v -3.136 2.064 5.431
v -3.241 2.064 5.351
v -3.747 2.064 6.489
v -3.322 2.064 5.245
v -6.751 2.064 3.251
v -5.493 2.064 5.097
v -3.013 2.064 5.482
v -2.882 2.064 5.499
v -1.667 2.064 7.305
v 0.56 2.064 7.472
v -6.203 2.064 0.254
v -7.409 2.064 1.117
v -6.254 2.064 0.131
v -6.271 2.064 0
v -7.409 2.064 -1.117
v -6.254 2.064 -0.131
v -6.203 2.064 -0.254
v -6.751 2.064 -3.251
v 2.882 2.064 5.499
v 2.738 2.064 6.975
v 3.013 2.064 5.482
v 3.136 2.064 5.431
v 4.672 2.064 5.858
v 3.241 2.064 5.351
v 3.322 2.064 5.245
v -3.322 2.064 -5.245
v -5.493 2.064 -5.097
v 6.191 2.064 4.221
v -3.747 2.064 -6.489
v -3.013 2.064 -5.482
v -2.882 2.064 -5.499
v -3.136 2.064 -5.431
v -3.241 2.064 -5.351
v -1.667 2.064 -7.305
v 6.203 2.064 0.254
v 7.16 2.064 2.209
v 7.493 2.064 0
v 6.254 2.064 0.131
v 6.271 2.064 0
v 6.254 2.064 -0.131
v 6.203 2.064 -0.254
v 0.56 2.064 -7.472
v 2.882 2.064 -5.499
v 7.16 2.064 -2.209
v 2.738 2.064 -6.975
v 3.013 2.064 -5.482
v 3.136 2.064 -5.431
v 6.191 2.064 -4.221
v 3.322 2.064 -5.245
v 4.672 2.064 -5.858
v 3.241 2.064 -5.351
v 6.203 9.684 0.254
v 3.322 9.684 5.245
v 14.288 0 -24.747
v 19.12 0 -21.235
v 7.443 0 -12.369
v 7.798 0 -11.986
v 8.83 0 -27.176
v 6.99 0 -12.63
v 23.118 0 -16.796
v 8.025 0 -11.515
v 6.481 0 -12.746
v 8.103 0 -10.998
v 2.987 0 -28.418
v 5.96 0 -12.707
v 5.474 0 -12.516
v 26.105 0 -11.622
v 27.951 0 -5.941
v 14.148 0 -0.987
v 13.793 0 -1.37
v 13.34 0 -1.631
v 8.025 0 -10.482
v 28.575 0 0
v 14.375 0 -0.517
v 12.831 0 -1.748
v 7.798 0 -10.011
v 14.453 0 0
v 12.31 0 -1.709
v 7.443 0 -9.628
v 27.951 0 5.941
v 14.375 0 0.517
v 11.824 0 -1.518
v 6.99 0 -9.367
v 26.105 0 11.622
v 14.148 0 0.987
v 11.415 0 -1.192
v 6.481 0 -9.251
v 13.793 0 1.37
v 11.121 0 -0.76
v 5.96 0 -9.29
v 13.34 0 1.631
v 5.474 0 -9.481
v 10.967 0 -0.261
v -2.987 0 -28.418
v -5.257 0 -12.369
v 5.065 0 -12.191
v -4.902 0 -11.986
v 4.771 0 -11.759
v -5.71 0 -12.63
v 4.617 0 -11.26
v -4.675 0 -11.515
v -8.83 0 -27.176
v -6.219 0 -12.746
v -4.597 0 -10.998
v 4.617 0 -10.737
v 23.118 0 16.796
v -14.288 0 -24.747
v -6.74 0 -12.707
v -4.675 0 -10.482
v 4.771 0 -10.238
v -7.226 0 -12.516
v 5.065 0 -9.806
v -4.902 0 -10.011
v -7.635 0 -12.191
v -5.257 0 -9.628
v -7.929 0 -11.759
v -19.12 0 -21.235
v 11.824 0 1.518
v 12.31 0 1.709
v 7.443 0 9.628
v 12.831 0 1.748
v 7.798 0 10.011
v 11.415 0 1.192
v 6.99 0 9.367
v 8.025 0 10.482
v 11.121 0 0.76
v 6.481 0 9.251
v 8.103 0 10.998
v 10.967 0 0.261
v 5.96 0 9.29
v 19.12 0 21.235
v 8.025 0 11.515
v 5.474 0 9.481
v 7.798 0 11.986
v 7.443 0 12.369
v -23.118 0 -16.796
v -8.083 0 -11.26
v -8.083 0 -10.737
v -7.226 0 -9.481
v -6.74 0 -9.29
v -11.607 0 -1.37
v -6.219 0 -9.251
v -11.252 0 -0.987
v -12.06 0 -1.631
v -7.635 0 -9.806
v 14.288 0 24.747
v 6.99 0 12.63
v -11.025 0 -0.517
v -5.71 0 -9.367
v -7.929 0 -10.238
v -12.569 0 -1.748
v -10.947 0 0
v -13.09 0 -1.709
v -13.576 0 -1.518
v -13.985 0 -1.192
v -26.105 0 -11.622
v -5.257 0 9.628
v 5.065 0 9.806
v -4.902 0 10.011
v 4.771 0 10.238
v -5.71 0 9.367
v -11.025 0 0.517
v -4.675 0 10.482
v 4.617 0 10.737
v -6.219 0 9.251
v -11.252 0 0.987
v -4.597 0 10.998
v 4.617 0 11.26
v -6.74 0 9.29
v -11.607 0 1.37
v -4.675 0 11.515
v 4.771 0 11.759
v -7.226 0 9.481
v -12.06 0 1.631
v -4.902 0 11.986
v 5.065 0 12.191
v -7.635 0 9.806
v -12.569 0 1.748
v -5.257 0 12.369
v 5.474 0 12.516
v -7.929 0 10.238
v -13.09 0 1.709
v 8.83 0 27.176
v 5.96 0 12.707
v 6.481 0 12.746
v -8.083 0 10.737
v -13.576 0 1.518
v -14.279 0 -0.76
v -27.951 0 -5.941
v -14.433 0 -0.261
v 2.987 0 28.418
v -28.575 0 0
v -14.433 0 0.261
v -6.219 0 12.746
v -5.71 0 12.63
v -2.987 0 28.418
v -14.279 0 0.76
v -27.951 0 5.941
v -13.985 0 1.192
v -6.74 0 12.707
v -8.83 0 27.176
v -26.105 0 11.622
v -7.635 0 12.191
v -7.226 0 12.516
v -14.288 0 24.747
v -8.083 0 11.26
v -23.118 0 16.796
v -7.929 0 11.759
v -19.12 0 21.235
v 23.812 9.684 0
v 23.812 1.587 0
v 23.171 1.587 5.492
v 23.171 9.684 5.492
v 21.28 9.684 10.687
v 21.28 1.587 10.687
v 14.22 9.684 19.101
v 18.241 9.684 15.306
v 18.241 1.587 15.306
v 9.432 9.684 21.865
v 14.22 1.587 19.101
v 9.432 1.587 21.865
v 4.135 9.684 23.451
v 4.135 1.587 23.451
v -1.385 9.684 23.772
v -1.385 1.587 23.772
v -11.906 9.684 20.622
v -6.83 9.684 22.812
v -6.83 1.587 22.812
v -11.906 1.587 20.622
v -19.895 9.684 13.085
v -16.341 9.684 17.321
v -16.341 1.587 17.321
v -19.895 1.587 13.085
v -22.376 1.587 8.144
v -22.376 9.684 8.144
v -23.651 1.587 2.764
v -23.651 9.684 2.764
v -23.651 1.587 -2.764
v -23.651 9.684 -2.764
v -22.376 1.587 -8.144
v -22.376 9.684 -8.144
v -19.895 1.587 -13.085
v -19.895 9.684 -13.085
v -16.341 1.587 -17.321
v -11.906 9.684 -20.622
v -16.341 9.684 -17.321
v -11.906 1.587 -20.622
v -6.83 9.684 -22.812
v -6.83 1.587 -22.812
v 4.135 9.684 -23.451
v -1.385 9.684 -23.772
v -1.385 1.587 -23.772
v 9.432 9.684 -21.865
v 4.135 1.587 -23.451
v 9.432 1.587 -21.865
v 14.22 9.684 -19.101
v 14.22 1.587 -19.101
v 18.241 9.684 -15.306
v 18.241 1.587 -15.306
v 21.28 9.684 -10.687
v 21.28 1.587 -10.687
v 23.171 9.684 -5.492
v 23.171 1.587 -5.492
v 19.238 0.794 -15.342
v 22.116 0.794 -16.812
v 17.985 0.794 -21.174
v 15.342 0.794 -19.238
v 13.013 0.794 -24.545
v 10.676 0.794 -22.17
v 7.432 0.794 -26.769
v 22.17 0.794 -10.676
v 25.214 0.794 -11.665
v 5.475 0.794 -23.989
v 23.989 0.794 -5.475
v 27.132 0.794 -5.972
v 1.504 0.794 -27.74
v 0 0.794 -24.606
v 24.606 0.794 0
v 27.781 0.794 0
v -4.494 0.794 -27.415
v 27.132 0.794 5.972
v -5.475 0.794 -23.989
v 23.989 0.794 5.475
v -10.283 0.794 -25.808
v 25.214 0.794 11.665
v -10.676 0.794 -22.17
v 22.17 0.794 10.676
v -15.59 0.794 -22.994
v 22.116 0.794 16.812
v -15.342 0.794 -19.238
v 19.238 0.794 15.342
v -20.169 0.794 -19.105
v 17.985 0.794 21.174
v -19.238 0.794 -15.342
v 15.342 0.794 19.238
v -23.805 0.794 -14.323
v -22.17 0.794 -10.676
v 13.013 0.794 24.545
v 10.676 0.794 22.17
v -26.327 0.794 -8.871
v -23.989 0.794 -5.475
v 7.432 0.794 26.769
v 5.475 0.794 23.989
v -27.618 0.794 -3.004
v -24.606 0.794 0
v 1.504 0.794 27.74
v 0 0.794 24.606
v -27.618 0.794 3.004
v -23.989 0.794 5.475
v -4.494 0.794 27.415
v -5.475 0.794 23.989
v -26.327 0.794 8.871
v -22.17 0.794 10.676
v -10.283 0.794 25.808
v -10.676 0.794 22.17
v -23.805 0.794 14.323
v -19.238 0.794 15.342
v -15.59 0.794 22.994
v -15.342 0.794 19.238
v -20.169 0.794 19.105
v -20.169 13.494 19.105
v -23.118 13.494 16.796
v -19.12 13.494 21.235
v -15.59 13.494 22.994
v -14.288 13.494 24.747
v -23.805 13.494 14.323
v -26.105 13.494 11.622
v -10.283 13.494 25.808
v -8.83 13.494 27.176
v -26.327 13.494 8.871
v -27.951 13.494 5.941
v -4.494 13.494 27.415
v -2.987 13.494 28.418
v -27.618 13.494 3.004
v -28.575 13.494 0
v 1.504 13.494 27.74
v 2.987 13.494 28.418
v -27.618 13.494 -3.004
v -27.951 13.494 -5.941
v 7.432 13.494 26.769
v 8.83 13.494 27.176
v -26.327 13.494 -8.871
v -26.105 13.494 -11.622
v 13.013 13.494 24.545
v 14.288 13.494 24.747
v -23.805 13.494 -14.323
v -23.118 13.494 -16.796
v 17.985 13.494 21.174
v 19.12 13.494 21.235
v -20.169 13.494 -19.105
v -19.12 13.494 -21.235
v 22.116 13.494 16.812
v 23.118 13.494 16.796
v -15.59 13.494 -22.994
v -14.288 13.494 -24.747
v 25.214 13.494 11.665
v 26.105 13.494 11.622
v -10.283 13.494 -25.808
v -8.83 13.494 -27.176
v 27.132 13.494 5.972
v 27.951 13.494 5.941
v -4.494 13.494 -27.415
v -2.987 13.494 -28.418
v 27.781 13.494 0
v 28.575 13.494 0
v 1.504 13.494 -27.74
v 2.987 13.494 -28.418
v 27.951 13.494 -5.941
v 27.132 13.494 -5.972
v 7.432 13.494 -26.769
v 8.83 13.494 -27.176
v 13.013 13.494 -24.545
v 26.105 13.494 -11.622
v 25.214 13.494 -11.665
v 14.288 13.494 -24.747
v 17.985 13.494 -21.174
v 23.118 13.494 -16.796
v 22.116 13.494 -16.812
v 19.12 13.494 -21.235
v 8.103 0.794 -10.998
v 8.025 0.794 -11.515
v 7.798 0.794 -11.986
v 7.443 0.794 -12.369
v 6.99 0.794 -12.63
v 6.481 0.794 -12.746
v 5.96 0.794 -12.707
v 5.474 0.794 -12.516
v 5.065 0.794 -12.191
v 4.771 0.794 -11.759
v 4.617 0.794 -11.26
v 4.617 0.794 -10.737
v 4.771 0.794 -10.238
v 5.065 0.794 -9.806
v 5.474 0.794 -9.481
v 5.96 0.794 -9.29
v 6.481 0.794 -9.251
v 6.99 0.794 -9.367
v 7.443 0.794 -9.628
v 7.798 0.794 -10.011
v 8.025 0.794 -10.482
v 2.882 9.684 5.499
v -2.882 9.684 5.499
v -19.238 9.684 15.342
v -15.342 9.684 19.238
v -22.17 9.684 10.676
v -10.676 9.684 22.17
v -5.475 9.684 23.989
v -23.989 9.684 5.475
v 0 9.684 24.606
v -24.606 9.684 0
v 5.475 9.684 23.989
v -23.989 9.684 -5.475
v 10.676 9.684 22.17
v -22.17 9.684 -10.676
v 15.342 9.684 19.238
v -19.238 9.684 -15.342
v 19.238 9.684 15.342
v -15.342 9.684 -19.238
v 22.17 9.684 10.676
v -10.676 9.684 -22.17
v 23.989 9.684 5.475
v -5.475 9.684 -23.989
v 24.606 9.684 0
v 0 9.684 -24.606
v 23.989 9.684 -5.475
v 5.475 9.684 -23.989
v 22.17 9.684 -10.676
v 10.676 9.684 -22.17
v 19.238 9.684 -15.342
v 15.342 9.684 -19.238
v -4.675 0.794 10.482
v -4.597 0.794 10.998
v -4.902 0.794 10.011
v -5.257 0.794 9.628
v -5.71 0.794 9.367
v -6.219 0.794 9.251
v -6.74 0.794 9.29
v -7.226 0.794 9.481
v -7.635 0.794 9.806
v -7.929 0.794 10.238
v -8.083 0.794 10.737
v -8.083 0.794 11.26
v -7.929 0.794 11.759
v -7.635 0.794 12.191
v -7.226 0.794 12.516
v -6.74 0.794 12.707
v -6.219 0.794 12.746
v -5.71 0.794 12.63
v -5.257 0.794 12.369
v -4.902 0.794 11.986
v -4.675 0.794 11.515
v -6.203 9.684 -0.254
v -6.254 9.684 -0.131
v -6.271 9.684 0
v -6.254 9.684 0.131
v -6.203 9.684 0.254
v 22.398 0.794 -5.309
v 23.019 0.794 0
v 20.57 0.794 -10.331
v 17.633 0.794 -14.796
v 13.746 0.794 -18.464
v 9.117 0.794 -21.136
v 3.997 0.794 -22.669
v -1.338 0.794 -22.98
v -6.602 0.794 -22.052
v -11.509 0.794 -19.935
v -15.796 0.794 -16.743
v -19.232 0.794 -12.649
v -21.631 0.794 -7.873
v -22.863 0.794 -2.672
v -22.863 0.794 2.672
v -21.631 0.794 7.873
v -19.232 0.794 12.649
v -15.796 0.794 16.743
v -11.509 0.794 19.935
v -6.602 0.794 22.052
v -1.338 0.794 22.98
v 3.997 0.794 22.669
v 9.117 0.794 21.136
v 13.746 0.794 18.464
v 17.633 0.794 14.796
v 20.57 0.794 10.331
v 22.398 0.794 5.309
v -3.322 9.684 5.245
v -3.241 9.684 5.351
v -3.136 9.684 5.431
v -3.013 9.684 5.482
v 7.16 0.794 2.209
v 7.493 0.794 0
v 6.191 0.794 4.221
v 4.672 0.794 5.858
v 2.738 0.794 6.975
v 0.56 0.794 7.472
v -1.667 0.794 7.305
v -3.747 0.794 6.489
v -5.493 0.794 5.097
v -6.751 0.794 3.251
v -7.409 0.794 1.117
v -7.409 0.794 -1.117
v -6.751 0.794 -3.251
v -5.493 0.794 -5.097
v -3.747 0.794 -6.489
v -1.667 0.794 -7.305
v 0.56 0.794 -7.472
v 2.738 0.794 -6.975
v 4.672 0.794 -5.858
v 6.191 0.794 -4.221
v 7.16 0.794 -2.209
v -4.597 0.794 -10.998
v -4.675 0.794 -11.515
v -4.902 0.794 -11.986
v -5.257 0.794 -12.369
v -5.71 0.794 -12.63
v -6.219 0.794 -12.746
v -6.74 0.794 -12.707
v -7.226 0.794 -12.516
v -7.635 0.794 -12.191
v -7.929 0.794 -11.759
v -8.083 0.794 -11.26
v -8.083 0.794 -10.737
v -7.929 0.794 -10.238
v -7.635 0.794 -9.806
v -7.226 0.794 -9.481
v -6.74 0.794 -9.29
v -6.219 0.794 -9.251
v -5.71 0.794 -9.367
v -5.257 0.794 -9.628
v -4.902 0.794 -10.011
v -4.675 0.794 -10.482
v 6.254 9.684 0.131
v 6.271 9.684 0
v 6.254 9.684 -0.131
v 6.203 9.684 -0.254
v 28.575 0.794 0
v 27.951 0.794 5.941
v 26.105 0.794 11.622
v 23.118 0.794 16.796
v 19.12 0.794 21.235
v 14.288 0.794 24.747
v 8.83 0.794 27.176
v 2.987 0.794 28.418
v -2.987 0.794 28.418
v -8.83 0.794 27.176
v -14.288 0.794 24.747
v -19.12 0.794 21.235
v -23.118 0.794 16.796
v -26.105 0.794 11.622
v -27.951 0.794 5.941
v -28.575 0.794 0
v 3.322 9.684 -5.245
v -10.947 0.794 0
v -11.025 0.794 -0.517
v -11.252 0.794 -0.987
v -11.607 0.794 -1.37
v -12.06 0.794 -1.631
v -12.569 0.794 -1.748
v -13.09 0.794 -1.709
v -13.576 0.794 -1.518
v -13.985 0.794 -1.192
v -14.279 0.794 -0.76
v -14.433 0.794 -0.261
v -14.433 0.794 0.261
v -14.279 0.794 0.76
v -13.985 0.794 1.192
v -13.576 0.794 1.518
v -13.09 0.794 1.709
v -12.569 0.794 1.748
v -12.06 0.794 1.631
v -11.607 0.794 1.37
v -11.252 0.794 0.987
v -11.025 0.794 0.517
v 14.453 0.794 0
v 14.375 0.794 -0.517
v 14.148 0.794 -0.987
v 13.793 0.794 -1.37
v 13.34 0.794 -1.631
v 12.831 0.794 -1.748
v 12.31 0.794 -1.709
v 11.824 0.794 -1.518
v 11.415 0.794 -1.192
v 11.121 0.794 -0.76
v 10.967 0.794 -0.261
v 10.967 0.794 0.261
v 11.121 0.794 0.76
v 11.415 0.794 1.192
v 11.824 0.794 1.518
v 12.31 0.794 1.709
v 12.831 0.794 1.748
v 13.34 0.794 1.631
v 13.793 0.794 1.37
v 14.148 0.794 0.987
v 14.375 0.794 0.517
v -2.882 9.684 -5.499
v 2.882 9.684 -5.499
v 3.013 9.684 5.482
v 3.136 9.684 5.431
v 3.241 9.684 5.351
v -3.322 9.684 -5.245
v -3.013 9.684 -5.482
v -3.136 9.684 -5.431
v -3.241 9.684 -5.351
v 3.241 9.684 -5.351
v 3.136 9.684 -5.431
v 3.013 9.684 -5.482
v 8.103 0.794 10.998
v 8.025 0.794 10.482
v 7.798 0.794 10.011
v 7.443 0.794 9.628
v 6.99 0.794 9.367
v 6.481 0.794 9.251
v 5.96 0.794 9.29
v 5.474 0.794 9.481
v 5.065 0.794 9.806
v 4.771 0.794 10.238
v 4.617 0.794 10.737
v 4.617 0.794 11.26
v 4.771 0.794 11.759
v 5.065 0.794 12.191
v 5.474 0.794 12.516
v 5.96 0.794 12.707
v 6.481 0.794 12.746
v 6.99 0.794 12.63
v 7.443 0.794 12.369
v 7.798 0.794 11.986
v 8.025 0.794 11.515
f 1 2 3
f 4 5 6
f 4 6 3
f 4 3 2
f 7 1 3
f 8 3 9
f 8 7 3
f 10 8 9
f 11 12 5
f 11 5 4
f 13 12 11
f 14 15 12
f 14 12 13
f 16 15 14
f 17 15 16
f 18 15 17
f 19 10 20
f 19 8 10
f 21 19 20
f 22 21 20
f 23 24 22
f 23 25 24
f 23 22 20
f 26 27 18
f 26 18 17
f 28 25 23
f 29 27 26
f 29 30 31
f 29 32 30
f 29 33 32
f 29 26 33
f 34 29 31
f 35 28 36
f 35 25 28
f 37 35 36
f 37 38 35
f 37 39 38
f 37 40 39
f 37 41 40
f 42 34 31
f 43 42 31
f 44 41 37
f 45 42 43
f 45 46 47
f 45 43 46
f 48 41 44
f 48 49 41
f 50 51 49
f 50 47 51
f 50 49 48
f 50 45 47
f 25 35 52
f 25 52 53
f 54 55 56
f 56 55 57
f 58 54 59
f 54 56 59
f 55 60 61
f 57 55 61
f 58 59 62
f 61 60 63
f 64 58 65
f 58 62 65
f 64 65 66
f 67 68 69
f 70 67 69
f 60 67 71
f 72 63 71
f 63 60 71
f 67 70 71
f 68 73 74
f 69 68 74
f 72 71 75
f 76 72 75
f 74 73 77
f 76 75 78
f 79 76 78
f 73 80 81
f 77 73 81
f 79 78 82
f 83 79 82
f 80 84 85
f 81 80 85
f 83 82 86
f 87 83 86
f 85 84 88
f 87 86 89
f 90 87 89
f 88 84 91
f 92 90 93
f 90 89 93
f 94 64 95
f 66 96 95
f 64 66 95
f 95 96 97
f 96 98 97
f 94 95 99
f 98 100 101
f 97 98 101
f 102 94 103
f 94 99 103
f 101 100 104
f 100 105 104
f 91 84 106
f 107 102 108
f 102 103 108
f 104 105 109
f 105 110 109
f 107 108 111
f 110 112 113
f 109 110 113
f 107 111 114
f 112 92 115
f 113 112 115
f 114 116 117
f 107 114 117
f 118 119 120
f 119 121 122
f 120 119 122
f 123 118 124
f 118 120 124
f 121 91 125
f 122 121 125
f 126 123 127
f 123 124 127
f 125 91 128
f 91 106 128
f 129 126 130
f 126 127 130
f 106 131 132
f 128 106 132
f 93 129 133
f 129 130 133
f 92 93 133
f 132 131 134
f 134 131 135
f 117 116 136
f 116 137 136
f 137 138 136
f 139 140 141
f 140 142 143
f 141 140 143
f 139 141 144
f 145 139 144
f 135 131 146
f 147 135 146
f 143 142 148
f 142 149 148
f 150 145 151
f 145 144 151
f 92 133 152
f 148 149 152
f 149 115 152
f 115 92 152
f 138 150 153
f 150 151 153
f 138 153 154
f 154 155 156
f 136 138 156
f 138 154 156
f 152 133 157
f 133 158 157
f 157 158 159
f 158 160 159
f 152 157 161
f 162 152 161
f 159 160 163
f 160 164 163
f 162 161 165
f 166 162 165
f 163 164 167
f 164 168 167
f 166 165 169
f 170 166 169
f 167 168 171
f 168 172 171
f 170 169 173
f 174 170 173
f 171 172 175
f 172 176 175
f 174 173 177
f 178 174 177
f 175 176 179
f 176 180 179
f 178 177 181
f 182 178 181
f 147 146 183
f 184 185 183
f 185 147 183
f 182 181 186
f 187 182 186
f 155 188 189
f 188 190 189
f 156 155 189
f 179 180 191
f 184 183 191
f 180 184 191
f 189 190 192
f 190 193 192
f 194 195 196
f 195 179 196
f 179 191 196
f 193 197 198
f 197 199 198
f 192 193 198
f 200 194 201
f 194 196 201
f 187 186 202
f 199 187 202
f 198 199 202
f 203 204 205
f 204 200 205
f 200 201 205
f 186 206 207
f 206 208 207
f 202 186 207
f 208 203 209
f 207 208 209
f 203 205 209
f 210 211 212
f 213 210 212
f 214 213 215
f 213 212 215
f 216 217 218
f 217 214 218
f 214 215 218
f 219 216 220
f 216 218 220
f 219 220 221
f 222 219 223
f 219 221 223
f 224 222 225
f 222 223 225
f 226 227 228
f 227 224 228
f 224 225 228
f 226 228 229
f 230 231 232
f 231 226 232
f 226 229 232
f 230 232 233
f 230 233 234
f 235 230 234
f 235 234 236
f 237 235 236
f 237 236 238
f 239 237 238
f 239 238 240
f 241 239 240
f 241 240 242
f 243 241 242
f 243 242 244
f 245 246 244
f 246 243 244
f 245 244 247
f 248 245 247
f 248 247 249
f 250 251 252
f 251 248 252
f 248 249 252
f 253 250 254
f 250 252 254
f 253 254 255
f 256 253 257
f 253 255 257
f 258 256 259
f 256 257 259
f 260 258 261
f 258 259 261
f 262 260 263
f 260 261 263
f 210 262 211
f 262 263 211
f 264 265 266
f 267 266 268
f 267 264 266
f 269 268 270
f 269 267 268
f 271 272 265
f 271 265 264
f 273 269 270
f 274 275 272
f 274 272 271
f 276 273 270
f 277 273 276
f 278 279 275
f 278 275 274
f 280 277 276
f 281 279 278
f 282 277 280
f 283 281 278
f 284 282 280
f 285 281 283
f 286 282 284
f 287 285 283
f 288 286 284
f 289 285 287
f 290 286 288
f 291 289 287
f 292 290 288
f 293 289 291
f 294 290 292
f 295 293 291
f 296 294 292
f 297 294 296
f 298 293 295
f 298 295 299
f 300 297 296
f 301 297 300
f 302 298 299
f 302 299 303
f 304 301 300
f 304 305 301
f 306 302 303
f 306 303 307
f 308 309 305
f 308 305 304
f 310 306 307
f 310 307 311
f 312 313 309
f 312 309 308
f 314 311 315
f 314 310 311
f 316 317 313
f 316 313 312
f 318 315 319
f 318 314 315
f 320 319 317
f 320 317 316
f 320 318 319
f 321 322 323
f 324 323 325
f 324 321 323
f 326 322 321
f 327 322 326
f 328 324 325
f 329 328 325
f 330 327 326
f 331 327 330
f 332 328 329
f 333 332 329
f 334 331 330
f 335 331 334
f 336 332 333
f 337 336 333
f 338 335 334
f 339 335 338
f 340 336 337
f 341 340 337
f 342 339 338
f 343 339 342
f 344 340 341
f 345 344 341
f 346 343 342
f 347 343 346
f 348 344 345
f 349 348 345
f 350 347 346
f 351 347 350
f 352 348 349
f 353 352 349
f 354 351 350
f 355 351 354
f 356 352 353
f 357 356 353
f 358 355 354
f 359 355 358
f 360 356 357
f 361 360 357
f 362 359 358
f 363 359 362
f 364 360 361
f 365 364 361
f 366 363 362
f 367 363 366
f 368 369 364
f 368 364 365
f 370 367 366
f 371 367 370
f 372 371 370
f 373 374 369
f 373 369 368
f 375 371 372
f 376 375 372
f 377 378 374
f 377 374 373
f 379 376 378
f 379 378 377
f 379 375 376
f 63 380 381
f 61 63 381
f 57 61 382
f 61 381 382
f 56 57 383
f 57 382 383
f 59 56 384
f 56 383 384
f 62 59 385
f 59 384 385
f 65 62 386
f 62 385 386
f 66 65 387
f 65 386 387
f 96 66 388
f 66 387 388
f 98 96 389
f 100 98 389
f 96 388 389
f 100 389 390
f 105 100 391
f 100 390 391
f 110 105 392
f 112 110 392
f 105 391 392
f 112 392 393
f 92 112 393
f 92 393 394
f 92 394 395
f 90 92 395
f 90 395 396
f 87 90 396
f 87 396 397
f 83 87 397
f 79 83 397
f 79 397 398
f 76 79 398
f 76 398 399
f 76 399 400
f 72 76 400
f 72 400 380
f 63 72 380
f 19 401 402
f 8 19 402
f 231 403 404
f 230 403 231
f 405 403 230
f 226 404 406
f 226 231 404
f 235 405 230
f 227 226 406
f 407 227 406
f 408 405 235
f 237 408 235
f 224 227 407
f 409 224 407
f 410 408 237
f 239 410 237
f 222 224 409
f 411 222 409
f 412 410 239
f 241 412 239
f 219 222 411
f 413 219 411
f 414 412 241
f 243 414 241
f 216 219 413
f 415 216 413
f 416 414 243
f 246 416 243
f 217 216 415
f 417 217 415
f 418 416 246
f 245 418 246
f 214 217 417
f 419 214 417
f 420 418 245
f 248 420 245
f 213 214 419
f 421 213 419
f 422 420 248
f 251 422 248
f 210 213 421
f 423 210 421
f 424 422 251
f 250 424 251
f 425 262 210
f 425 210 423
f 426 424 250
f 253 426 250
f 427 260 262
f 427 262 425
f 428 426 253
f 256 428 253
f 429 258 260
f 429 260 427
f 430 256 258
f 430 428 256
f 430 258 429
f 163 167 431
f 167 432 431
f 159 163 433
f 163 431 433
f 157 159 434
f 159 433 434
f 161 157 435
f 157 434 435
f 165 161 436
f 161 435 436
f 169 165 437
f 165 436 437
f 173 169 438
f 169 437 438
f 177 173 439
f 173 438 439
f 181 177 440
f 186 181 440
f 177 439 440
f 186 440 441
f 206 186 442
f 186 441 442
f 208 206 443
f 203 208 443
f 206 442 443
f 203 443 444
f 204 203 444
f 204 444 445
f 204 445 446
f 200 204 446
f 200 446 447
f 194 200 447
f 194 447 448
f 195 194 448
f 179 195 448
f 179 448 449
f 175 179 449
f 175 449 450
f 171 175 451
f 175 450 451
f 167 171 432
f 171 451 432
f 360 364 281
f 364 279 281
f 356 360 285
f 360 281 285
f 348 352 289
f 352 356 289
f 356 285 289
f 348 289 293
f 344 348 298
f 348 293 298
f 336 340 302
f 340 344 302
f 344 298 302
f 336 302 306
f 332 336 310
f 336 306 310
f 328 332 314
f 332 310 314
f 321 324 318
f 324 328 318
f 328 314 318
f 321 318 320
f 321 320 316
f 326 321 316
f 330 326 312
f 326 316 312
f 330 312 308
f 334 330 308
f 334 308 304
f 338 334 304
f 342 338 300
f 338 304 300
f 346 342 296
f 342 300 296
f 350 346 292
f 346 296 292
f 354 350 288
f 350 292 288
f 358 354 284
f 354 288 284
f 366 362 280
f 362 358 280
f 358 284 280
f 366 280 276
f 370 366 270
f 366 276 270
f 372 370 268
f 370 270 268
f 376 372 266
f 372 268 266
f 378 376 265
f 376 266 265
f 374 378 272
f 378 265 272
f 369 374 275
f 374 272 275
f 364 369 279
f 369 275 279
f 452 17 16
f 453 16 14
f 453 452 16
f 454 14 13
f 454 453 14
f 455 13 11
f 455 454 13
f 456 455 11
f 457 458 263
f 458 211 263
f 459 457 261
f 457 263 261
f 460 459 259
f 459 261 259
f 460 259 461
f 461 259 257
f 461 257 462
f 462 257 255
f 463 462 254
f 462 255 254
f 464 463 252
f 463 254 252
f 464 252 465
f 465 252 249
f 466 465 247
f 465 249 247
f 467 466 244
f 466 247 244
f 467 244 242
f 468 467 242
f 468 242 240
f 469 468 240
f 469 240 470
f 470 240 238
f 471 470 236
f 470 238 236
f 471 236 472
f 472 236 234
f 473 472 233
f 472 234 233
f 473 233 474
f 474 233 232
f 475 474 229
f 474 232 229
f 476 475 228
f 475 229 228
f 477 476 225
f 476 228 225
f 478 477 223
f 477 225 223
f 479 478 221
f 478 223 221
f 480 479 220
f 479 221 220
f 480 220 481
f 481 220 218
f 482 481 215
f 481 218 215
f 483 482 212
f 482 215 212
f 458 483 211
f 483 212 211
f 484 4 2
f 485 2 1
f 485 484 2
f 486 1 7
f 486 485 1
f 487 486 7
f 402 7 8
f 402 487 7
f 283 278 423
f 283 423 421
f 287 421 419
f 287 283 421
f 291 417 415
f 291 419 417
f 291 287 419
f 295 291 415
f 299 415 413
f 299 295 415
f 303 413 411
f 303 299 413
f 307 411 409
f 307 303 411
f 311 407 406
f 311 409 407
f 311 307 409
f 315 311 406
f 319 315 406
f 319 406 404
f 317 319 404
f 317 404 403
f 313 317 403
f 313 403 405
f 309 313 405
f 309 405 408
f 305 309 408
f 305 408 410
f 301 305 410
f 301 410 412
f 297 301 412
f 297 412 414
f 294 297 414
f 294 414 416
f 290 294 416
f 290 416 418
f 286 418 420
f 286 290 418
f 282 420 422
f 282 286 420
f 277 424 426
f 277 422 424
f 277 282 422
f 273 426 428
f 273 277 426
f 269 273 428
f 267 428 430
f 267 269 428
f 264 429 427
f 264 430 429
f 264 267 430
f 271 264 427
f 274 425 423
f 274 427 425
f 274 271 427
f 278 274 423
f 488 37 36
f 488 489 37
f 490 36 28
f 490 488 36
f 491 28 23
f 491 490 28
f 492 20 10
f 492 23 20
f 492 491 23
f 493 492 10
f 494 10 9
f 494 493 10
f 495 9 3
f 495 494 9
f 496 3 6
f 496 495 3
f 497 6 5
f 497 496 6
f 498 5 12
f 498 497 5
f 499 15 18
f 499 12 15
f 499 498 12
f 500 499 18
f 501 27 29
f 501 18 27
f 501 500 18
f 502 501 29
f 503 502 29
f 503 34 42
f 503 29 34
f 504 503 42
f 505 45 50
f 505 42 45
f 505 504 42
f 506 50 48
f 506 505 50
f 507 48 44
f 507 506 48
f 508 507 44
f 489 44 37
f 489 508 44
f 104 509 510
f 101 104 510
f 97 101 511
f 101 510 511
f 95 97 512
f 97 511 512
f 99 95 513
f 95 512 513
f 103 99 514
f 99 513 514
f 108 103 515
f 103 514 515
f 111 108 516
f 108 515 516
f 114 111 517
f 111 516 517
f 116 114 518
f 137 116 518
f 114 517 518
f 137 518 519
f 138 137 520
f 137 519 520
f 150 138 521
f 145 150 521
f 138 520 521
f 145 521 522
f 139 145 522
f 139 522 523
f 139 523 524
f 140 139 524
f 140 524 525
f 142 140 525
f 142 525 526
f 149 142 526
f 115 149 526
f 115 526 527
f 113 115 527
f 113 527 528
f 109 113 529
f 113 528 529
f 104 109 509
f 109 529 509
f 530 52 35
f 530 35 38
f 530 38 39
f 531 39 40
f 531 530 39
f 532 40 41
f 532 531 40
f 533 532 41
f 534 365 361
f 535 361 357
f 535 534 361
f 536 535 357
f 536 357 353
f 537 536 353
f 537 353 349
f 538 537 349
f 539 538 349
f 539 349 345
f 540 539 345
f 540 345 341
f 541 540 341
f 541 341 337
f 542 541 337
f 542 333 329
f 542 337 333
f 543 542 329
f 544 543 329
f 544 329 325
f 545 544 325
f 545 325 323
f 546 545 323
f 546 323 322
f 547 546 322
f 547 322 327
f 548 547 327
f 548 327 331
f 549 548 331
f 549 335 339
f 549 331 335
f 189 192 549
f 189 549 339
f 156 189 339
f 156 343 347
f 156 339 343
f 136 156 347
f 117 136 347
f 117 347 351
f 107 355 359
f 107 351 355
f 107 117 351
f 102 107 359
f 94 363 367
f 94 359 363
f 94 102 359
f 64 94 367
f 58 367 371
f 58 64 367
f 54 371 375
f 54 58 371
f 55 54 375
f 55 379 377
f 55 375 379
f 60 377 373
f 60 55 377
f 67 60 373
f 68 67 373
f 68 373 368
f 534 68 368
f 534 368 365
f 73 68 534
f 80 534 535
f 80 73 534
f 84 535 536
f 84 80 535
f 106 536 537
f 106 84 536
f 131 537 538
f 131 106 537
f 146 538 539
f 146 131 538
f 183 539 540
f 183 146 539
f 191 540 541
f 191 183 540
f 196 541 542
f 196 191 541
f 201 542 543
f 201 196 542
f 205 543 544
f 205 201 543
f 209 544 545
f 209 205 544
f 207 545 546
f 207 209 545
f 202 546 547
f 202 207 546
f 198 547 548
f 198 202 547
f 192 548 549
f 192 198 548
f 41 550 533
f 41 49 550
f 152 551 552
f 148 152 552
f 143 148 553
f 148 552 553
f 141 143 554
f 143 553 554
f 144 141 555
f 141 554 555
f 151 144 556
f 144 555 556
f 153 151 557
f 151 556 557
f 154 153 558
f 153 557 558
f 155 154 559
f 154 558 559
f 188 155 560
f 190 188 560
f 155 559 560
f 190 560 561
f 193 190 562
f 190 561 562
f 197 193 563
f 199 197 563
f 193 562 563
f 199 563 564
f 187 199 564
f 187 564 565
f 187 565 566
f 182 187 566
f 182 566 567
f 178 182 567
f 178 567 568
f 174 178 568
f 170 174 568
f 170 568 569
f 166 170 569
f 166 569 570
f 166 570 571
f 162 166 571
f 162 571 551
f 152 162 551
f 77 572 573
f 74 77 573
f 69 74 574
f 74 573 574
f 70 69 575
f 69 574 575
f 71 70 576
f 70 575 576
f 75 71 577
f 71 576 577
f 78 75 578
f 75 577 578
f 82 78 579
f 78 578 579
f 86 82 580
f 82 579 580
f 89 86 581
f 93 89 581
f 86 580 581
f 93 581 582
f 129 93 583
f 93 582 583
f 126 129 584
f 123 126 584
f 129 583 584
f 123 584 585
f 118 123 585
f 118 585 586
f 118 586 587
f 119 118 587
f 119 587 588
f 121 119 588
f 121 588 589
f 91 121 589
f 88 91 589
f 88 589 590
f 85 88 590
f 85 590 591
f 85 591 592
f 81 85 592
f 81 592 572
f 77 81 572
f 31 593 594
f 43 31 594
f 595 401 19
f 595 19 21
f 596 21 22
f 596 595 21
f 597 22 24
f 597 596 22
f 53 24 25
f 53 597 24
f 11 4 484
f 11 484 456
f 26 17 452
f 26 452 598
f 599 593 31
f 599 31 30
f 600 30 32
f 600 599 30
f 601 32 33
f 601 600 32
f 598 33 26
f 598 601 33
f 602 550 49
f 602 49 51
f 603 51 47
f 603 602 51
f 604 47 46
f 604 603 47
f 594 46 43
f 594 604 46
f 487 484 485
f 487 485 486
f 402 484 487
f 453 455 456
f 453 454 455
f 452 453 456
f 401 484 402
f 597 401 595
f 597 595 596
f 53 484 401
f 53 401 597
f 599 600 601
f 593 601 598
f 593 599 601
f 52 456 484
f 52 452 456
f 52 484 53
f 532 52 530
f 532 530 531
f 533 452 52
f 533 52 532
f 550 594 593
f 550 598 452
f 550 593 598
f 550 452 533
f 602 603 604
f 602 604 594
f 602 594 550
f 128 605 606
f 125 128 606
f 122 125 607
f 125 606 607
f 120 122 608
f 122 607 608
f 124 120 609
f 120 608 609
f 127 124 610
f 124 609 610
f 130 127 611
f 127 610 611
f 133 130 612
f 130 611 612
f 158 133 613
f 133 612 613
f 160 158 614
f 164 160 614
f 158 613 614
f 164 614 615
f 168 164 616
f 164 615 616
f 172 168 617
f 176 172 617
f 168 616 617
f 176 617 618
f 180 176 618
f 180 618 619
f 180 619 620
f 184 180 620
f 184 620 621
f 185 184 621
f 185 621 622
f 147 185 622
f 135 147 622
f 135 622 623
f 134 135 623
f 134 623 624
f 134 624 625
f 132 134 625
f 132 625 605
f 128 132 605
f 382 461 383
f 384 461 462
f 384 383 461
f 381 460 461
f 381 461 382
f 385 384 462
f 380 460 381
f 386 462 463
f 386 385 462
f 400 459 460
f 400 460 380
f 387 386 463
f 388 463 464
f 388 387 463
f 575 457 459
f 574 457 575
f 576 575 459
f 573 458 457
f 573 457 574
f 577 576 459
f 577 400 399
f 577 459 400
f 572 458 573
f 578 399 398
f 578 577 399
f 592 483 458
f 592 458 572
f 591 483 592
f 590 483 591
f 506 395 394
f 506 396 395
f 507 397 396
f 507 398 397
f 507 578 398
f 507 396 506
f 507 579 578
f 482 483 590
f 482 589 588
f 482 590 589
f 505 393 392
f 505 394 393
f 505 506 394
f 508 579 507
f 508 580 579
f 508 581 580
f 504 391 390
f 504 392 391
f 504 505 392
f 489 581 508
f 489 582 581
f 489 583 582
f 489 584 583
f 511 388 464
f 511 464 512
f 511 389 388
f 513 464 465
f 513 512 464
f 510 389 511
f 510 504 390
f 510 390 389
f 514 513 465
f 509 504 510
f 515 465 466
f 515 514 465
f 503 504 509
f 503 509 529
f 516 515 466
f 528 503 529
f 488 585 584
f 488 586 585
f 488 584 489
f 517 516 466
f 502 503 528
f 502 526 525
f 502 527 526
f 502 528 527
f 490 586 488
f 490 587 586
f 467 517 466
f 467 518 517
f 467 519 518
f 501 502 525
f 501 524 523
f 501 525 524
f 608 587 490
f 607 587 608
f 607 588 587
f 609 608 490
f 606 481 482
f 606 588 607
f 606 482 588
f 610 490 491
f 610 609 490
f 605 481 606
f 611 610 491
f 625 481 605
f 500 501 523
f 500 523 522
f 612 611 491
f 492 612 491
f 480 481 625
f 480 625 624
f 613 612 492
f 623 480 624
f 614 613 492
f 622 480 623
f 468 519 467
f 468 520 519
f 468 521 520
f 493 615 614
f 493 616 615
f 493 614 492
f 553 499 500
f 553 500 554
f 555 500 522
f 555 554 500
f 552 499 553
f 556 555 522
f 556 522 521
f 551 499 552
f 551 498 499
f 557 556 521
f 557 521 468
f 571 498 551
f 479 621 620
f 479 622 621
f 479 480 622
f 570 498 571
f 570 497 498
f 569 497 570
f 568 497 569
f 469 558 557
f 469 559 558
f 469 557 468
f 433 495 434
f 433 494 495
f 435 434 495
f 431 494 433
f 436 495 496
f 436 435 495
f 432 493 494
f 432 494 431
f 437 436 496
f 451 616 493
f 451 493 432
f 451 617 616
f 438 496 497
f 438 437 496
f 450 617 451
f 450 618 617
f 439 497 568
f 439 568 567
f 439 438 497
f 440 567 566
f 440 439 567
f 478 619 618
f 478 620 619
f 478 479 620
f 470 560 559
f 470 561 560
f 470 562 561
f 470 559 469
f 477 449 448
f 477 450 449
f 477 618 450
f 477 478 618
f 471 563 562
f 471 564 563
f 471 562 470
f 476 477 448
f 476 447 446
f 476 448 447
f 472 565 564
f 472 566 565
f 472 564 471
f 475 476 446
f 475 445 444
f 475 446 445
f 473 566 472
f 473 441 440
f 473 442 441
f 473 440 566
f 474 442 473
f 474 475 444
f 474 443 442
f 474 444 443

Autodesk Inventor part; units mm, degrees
ref_plane "YZ Plane" through (0, 0, 0) normal (1, 0, 0) x (0, 1, 0)
ref_plane "XZ Plane" through (0, 0, 0) normal (0, 1, 0) x (-1, 0, 0)
ref_plane "XY Plane" through (0, 0, 0) normal (0, 0, 1) x (1, 0, 0)
sketch "Sketch1" plane through (0, 0, 0) normal (0, 1, 0) x (-1, 0, 0)
  circle A0 centre (0, 0) radius 28.575
  dimension "d0" = 57.15
extrude "Extrusion1" add sketch "Sketch1" along normal blind 0.7937
sketch "Sketch2" plane through (0, 0.7937, 0) normal (0, 1, 0) x (1, 0, 0)
  line L0 (0, 0) -> (-28.575, 0) construction
  circle A0 centre (0, 0) radius 28.575 projected
  line L1 (-6.35, 0) -> (-3.175, 5.4993)
  line L2 (-3.175, 5.4993) -> (3.175, 5.4993)
  line L3 (3.175, 5.4993) -> (6.35, 0)
  line L4 (6.35, 0) -> (3.175, -5.4993)
  line L5 (3.175, -5.4993) -> (-3.175, -5.4993)
  line L6 (-3.175, -5.4993) -> (-6.35, 0)
  circle A1 centre (0, 0) radius 23.8125
  circle A2 centre (0, 0) radius 24.6063
  circle A3 centre (0, 0) radius 27.7812
  circle A4 centre (0, 0) radius 7.493
  circle A5 centre (0, 0) radius 12.7 construction
  circle A6 centre (-12.7, 0) radius 1.7526
  circle A7 centre (-6.35, -10.9985) radius 1.7526
  circle A8 centre (6.35, -10.9985) radius 1.7526
  circle A9 centre (12.7, 0) radius 1.7526
  circle A10 centre (6.35, 10.9985) radius 1.7526
  circle A11 centre (-6.35, 10.9985) radius 1.7526
  dimension "d18" = 25.4
  dimension "d3" = 6.35
  dimension "d4" = 47.625
  dimension "d5" = 0.7937
  dimension "d6" = 0.7937
  dimension "d15" = 14.986
  dimension "d19" = 3.5052
  dimension "d22" = 360
extrude "Extrusion2" add sketch "Sketch2" along normal blind 8.89 contours L1 L2 L3 L4 L5 L6 | A2
fillet "Fillet1" radius 0.508 6 edges at (6.35, 5.2387, 0) (3.175, 5.2387, -5.4993) (-3.175, 5.2387, -5.4993) (-6.35, 5.2387, 0) (-3.175, 5.2387, 5.4993) (3.175, 5.2387, 5.4993)
extrude "Extrusion3" add sketch "Sketch2" along normal blind 12.7 contours A0
chamfer "Chamfer1" distance 0.7937 angle 45 1 edges at (-23.8125, 0.7937, 0)
extrude "Extrusion4" add sketch "Sketch2" along normal blind 1.27 contours L1 L2 L3 L4 L5 L6 | A4
extrude "Extrusion5" cut sketch "Sketch2" against normal through all contours A6 | A7 | A8 | A9 | A10 | A11
properties part number "Wheel V2 Mold"
